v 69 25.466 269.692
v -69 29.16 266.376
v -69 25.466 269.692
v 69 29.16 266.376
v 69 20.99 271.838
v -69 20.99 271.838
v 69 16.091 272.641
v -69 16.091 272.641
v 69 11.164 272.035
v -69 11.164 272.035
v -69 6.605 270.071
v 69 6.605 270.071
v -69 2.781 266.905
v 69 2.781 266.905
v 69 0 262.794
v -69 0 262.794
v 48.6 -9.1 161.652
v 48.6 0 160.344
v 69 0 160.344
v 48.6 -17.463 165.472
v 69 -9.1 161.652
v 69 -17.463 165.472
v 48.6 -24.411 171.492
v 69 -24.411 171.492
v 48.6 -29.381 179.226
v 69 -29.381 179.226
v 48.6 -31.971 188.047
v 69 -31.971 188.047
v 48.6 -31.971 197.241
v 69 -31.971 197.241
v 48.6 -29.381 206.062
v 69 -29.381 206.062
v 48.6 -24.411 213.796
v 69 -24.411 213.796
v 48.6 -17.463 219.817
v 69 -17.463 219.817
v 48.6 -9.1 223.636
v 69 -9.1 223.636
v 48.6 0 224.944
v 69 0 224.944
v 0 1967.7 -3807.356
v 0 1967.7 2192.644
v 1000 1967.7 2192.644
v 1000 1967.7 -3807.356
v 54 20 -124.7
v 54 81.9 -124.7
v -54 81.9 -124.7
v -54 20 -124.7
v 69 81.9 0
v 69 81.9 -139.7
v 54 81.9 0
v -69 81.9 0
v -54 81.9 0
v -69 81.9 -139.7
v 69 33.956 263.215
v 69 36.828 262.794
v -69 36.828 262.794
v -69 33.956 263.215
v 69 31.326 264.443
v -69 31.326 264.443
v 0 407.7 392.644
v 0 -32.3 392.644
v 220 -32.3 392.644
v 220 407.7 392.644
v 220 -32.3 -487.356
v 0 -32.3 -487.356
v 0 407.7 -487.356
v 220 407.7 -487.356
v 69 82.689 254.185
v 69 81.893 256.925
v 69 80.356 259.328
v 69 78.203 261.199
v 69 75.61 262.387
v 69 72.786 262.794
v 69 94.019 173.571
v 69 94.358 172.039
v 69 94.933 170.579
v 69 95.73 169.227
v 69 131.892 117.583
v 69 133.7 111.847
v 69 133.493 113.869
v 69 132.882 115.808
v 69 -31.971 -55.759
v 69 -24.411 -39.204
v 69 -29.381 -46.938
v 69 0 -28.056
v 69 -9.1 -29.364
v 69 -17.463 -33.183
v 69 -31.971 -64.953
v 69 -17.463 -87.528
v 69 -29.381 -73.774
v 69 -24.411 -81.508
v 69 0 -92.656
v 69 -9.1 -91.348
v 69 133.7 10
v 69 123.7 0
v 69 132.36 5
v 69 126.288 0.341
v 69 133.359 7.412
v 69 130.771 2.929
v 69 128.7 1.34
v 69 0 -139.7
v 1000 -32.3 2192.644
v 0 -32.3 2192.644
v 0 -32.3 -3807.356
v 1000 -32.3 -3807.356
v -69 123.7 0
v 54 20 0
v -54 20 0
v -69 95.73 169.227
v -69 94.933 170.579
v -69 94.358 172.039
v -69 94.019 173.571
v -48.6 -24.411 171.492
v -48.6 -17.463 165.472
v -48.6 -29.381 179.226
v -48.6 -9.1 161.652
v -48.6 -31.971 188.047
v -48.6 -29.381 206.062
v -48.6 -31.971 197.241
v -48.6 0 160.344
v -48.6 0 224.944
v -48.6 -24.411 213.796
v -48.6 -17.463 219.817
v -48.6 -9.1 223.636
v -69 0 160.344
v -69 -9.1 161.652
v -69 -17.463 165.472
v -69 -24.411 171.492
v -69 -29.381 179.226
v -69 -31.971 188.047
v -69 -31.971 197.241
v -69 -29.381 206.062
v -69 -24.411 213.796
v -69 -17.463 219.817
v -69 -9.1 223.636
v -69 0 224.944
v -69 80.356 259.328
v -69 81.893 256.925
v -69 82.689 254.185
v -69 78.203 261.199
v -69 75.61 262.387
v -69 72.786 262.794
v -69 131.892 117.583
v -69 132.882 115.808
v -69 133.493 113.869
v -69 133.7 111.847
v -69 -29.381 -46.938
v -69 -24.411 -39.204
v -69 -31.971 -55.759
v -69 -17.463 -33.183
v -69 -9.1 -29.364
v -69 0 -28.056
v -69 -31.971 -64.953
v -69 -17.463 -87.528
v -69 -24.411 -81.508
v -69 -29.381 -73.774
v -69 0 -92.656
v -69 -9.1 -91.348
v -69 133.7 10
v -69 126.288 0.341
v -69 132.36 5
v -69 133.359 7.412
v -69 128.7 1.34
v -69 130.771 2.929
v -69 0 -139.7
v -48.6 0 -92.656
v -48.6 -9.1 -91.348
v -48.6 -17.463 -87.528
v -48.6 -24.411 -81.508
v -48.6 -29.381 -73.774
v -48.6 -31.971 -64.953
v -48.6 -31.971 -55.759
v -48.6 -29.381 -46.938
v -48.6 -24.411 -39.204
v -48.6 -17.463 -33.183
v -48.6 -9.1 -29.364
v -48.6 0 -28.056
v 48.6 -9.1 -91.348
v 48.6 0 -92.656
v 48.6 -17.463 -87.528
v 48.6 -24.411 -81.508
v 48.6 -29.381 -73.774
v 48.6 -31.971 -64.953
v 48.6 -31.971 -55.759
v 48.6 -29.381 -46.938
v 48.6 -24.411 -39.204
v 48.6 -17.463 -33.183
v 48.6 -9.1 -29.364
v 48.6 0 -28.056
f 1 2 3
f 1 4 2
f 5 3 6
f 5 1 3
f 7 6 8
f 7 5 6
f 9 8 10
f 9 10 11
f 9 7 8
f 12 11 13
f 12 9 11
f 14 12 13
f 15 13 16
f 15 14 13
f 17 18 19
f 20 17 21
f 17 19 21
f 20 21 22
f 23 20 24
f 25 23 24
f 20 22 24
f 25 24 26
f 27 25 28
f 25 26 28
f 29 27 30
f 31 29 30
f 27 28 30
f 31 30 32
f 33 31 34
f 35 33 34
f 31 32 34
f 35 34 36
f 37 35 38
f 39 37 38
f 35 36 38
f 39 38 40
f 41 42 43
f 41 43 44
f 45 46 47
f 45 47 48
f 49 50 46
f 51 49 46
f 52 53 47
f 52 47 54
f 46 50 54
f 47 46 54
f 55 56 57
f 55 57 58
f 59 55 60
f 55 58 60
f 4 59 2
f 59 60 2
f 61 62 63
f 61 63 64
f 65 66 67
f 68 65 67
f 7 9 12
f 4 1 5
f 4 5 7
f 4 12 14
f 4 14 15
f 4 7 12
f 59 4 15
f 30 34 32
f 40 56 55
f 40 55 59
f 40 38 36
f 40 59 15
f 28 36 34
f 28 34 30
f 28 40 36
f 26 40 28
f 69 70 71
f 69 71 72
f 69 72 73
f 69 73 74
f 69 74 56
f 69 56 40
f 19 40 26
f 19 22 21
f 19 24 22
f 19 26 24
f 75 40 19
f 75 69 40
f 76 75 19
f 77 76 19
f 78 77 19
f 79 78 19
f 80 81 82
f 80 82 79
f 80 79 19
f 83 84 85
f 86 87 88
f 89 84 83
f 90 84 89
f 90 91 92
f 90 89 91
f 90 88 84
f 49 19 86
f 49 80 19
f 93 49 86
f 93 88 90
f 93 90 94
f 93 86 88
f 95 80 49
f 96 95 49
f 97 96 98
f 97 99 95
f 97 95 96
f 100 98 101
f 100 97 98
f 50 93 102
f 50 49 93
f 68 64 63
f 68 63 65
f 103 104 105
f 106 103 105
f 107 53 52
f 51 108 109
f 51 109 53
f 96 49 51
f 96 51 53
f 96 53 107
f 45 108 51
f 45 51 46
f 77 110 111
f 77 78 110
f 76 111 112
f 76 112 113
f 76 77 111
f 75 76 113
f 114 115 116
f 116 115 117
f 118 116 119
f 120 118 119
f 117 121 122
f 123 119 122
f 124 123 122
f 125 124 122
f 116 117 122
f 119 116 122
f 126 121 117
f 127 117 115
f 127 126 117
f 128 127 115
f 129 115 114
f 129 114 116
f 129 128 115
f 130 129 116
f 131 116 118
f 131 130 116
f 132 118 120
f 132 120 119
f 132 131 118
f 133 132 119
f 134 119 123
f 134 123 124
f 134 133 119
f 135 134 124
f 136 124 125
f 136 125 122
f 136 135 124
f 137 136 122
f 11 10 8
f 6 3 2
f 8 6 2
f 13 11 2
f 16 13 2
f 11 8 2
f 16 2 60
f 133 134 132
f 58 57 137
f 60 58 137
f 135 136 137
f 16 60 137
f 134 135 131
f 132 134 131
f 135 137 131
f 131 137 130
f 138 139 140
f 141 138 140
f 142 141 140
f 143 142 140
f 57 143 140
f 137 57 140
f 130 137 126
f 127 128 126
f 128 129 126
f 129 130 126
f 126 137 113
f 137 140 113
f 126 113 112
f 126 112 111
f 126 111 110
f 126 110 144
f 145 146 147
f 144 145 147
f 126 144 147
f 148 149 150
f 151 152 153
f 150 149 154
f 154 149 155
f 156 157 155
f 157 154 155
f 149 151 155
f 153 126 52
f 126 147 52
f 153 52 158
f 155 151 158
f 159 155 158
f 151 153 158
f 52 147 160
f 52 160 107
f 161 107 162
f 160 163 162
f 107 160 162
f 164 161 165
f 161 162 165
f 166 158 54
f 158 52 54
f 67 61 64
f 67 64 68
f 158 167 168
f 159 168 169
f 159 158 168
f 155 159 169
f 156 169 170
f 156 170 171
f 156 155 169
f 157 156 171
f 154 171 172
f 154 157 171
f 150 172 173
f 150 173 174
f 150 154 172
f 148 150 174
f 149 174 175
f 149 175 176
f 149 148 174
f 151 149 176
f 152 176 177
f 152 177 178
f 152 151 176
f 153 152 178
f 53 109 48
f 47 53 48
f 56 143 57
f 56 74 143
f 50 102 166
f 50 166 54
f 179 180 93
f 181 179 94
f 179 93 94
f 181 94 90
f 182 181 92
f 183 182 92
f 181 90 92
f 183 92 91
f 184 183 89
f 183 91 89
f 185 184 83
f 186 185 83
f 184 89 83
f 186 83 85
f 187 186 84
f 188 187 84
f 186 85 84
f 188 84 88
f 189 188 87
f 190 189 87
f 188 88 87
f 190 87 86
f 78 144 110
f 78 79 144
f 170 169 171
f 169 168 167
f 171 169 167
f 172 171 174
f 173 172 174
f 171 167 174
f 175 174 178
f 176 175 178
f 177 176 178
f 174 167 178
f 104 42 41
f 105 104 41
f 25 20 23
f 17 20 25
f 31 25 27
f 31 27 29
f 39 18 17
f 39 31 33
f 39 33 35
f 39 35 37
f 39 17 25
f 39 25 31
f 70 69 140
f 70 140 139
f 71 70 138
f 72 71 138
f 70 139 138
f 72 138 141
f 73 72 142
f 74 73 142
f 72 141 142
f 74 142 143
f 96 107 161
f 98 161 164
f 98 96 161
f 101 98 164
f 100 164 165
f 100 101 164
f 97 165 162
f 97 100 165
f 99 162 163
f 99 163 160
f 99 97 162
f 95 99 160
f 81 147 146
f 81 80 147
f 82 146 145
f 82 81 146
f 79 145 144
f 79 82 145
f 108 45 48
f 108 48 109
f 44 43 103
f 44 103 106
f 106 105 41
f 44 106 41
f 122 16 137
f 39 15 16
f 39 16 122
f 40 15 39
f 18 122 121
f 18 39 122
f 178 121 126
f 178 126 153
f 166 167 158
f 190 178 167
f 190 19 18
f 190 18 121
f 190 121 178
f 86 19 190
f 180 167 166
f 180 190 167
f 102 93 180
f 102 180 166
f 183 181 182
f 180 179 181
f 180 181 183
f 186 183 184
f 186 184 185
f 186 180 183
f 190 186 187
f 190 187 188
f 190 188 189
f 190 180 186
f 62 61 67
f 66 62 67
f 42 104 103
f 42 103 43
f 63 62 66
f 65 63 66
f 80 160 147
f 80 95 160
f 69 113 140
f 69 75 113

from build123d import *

# Parameters (mm, degrees)
BOSS_EXTRUDE1_DEPTH = 69
SKETCH4_W           = 15
SKETCH4_H           = 124.7
BOSS_EXTRUDE2_DEPTH = 61.9
BOSS_EXTRUDE3_DEPTH = 20.4
FILLET1_R           = 10
SKETCH6_W           = 6000
SKETCH6_H           = 2000
BOSS_EXTRUDE4_DEPTH = 1000
SKETCH8_W           = 880
SKETCH8_H           = 440
BOSS_EXTRUDE5_DEPTH = 220


with BuildPart() as part:
    # Sketch2 → Boss-Extrude1 (new body, symmetric)
    with BuildSketch(Plane(origin=(0, 0, 0), x_dir=(0, 0, -1), z_dir=(1, 0, 0))):
        with BuildLine():
            Line((-262.793626597, 0), (0, 0))
            Line((0, 0), (139.7, 0))
            Line((139.7, 0), (139.7, 81.9))
            Line((139.7, 81.9), (124.7, 81.9))
            Line((124.7, 81.9), (124.7, 20))
            Line((124.7, 20), (0, 20))
            Line((0, 20), (0, 133.7))
            Line((0, 133.7), (-115, 133.7))
            Line((-115, 133.7), (-171.193830238, 94.352656466))
            Line((-171.193830238, 94.352656466), (-262.793626597, 81.479144628))
            Line((-262.793626597, 81.479144628), (-262.793626597, 31.479144628))
            ThreePointArc((-262.793626597, 31.479144628), (-272.644060375, 15.739572314), (-262.793626597, 0))
        make_face()
    extrude(amount=BOSS_EXTRUDE1_DEPTH, both=True)

    # Sketch4 → Boss-Extrude2 (add)
    with BuildSketch(Plane(origin=(0, 20, 0), x_dir=(1, 0, 0), z_dir=(0, 1, 0))):
        with Locations((61.5, 62.35)):
            Rectangle(SKETCH4_W, SKETCH4_H)
    boss_extrude2 = extrude(amount=BOSS_EXTRUDE2_DEPTH)

    # Mirror1: Boss-Extrude2 across plane
    add(boss_extrude2.mirror(Plane(origin=(0, 0, 0), x_dir=(0, 0, 1), z_dir=(1, 0, 0))))

    # Sketch5 → Boss-Extrude3 (add)
    with BuildSketch(Plane(origin=(69, 0, 0), x_dir=(0, 0, -1), z_dir=(1, 0, 0))):
        with BuildLine():
            Line((-224.944060375, 0), (-160.344060375, 0))
            ThreePointArc((-160.344060375, 0), (-192.644060375, -32.3), (-224.944060375, 0))
        make_face()
        with BuildLine():
            Line((28.055939625, 0), (92.655939625, 0))
            ThreePointArc((92.655939625, 0), (60.355939625, -32.3), (28.055939625, 0))
        make_face()
    boss_extrude3 = extrude(amount=-BOSS_EXTRUDE3_DEPTH)

    # Mirror2: Boss-Extrude3 across plane
    add(boss_extrude3.mirror(Plane(origin=(0, 0, 0), x_dir=(0, 0, 1), z_dir=(1, 0, 0))))

    # Fillet1
    fillet1_edges = [part.edges().sort_by_distance(p)[0] for p in [
        (0, 31.479144628, 262.793626597),
        (0, 81.479144628, 262.793626597),
        (0, 94.352656466, 171.193830238),
        (0, 133.7, 115),
        (0, 133.7, 0),
    ]]
    fillet(fillet1_edges, radius=FILLET1_R)


with BuildPart() as body_2:
    # Sketch6 → Boss-Extrude4 (new body)
    with BuildSketch(Plane(origin=(0, 0, 0), x_dir=(0, 0, -1), z_dir=(1, 0, 0))):
        with Locations((807.355939625, 967.7)):
            Rectangle(SKETCH6_W, SKETCH6_H)
    extrude(amount=BOSS_EXTRUDE4_DEPTH)


with BuildPart() as body_3:
    # Sketch8 → Boss-Extrude5 (new body)
    with BuildSketch(Plane(origin=(0, 0, 0), x_dir=(0, 0, -1), z_dir=(1, 0, 0))):
        with Locations((47.355939625, 187.7)):
            Rectangle(SKETCH8_W, SKETCH8_H)
    extrude(amount=BOSS_EXTRUDE5_DEPTH)


solid = Compound([part.part, body_2.part, body_3.part])
